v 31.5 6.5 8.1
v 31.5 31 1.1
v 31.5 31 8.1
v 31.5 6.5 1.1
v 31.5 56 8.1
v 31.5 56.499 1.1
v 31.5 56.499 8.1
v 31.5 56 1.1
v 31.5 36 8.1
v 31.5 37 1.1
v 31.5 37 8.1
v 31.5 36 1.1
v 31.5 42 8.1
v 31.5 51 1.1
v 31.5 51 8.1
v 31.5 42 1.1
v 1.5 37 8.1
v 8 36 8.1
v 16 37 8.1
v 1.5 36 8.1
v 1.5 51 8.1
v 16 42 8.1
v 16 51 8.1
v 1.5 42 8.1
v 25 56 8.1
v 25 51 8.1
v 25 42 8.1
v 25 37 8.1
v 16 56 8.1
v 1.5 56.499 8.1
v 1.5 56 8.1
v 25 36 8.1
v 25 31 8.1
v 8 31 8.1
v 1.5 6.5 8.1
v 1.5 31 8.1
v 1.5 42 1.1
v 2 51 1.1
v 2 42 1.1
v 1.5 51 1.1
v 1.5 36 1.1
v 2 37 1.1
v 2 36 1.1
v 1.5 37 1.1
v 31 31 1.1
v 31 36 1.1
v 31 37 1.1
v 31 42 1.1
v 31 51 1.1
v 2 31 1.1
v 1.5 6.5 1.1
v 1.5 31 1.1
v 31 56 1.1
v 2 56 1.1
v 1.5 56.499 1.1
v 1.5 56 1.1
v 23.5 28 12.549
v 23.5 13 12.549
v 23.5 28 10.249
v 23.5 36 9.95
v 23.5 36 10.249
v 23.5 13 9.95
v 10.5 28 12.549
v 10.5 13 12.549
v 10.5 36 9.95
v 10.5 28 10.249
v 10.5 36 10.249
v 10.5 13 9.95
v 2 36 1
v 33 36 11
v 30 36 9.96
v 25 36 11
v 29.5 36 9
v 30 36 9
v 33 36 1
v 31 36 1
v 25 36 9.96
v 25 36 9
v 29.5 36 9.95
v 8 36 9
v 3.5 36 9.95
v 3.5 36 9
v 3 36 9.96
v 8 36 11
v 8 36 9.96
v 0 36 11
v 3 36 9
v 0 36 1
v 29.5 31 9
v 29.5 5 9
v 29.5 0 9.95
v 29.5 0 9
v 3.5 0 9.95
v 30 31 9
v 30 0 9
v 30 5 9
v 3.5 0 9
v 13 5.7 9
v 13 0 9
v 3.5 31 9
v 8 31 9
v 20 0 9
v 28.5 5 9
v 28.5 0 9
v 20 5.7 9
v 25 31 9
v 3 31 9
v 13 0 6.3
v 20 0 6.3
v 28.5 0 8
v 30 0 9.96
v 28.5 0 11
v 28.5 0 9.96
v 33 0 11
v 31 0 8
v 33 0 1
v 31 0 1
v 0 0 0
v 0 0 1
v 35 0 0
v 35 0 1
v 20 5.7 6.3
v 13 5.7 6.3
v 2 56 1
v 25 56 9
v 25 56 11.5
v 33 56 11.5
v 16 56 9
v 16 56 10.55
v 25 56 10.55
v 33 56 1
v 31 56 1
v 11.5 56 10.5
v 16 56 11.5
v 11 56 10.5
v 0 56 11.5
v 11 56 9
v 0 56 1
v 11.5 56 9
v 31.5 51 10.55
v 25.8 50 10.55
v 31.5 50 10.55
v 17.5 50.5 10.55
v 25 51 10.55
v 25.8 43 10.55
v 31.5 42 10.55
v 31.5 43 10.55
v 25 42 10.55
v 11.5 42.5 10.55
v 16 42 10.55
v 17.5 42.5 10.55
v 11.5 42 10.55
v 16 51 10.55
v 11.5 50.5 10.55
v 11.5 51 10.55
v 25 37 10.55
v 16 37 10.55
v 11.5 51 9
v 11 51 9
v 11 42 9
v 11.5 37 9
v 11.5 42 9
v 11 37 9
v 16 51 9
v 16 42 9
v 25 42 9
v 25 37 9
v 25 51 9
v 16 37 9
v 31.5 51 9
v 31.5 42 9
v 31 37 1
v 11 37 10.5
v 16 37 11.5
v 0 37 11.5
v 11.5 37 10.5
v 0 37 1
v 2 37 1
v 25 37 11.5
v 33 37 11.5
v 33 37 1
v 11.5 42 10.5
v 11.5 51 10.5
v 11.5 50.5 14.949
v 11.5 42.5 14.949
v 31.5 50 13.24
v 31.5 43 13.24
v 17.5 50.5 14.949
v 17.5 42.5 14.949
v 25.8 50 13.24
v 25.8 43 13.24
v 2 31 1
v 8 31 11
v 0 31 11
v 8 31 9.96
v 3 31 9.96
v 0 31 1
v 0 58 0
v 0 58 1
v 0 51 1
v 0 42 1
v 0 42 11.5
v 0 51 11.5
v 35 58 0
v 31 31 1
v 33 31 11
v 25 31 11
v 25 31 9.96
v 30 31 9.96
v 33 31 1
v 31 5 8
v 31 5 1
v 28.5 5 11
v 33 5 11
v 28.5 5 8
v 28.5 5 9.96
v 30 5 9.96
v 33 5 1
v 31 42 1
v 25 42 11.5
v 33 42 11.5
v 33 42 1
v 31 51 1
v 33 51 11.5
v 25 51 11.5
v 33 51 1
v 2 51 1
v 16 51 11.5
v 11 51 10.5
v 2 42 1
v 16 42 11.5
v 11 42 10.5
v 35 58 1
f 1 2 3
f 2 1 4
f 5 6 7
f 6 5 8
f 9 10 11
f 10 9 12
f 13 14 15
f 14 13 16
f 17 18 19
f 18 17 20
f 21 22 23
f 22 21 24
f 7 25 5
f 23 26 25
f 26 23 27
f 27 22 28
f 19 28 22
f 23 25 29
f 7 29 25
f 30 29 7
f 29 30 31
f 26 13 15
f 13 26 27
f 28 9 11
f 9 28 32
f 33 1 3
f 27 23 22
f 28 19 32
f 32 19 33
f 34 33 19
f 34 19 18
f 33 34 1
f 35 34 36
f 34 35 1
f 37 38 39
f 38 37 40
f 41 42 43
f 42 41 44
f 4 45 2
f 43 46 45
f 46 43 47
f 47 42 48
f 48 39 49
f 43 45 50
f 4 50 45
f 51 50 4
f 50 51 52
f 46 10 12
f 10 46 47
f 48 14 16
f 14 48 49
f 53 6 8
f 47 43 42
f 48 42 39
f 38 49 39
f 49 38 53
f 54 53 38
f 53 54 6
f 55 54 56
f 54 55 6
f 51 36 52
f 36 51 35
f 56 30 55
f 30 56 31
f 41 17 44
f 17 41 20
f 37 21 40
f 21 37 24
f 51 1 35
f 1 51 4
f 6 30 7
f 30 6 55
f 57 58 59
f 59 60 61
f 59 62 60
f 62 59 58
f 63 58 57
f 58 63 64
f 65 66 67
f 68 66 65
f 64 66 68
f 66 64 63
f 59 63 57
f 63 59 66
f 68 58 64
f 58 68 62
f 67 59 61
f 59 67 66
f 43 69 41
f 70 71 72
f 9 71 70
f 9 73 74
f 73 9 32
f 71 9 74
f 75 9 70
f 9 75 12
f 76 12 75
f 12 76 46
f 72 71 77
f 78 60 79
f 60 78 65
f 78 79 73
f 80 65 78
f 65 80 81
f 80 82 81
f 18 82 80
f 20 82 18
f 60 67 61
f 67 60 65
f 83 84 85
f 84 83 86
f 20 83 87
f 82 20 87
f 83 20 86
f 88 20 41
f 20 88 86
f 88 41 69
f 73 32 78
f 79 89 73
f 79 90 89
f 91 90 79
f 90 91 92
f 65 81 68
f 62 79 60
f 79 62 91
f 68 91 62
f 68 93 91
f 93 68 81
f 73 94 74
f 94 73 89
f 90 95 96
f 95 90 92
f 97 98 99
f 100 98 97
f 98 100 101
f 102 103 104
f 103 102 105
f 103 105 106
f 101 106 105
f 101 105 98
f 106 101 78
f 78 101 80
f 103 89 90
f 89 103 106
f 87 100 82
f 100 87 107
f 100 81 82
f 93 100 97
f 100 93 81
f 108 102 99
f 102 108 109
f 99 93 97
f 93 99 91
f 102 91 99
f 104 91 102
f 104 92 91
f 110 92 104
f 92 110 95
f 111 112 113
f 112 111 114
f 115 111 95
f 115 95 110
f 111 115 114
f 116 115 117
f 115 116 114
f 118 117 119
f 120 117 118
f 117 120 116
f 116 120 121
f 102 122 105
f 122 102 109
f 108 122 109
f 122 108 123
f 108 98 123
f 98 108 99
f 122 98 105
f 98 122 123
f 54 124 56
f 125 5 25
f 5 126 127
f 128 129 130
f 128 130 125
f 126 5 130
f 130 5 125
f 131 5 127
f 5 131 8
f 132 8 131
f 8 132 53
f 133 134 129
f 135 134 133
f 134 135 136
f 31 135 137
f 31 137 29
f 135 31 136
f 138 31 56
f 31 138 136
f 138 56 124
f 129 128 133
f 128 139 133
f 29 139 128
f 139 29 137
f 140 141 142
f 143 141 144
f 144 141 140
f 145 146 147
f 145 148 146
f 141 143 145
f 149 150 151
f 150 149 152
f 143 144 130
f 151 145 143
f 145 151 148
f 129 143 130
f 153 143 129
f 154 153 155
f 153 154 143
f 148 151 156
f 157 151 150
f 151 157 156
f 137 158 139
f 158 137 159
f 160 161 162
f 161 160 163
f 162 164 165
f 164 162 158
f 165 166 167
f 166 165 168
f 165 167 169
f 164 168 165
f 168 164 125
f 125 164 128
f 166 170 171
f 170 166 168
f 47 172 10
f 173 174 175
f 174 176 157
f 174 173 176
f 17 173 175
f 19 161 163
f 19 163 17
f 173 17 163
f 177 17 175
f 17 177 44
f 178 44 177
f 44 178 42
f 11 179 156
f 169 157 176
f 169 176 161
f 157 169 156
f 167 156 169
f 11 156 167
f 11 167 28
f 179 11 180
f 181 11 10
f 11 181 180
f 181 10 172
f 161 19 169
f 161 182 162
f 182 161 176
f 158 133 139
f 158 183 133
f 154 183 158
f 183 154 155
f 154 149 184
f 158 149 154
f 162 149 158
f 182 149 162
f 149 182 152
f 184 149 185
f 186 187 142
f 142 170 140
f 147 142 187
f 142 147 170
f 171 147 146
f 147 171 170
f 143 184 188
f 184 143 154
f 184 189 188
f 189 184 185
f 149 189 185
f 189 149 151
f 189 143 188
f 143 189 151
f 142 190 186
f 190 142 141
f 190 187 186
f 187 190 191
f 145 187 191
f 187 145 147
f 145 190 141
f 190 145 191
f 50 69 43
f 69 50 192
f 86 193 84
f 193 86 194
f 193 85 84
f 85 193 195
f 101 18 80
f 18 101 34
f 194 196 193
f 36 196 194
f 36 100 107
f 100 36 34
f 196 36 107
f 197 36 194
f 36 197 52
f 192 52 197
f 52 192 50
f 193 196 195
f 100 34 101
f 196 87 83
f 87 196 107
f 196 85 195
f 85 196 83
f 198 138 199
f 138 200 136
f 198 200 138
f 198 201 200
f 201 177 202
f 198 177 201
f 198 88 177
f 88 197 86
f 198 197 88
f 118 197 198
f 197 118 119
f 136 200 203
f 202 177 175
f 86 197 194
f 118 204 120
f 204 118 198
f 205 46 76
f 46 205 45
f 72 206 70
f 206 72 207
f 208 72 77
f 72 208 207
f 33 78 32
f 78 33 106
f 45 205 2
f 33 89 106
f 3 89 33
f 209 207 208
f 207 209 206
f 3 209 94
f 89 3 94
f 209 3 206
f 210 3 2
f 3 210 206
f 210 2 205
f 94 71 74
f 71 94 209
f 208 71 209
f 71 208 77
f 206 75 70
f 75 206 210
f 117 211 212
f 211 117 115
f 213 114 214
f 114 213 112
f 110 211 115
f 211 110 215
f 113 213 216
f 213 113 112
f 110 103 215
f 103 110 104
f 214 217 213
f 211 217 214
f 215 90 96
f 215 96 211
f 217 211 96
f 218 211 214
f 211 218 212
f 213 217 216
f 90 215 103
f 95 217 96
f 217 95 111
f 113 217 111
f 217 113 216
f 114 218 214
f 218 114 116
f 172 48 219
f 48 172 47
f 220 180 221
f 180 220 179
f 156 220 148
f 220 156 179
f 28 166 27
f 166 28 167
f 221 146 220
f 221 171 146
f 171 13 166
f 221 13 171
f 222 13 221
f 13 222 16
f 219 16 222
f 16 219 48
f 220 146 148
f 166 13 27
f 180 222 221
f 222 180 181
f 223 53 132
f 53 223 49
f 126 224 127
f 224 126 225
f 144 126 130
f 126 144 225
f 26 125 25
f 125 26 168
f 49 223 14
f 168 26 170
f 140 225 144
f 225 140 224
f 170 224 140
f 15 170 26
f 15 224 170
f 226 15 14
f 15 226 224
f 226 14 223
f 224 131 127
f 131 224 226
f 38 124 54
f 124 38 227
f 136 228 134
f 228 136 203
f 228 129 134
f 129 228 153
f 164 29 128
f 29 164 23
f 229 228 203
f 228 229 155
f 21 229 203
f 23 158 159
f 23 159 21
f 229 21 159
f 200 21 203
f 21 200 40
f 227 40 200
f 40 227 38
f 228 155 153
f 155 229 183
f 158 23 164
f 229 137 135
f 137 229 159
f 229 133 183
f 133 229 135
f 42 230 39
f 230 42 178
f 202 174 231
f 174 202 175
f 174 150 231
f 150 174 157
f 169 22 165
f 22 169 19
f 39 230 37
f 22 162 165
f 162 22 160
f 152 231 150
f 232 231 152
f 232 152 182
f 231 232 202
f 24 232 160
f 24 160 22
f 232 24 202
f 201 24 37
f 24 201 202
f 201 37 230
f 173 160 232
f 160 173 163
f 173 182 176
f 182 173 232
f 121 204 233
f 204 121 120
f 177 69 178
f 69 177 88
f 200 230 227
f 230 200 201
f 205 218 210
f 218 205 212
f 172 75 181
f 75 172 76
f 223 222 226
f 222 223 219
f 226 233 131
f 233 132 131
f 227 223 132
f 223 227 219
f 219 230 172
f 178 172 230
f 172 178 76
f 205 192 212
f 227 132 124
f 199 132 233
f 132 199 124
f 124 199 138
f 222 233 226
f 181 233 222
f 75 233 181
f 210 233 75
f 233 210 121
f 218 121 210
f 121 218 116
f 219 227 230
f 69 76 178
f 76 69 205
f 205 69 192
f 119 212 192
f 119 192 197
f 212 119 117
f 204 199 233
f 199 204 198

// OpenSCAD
// the "face hugger"

// NON-PRINTED MODULES

module battery() {
    union() {
        color("silver")
            cube([30, 43.25, 7]);
        translate([0, 43.249, 0])
            color("yellow")
                cube([30, 6.75, 7]);
    }
}

module wemos() {
        union() {
            color([0.26, 0.32, 0.6])
                cube([26, 36, 0.95]); // board
            translate([7, 13, 0.949]) {
                color("silver")
                    cube([13, 15, 2.6]); // ESP8266 
                color("black")
                    cube([13, 23, 0.3]); // ESP8266 carrier
            }
            translate([9.5, 0, -2.7])
                color("silver")
                    cube([7, 5.7, 2.7]); // USB             
        }
}

module charger() {
        union() {
            color([0.26, 0.32, 0.6])
                cube([19, 20, 1.55]); // board
            translate([5.5, 14, 0.949])
                color("black")
                    cube([8, 6, 5]); // JST
            translate([6, 0, 1.54])
                color("silver")
                    cube([7, 5.7, 2.7]); // USB             
        }
}

// PRINTED SLED COMPONENTS

module wemos_grabber(depth) {
    union() {
        cube([2, 5, 11]);
        translate([-2-depth, 0, 8])
            difference() {
                cube([depth+2, 5, 3]);
                translate([-3, -1, 1])
                    cube([depth+4, 7, 0.96]);
            }

    }
}

module charger_grabber(depth, slot) {
    union() {
        cube([2, 5, 11.5]);
        translate([-2-depth, 0, 8])
            difference() {
                cube([depth+2, 5, 3.5]);
                translate([-3, -1, 1])
                    cube([slot+4, 7, 1.5]);
            }

    }
}

module sled() {
    // bottom plane
    cube([35, 58, 1]);

    // wemos grabbers
    translate([2, 36, 0]) // top left
    rotate([0, 0, 180])
        wemos_grabber(4);
    translate([31, 31, 0]) // top right
        wemos_grabber(4);    
    translate([31, 0, 0]) // bottom right
        wemos_grabber(0.5);
   
    // charger grabbers 
    translate([31, 37, 0]) // bottom right
        charger_grabber(4, 4.1);      
    translate([31, 51, 0]) // top right
        charger_grabber(4, 4.1);
    rotate([0, 0, 180]) {    
        translate([-2, -56, 0]) // top left
            charger_grabber(12, 4);      
        translate([-2, -42, 0]) // bottom left
            charger_grabber(12, 4);
    }

    // fillets
    
}

preview = 1;

if (preview) {
    translate([1.5, 6.5, 1.1])
        battery();

    translate([3.5, 0, 9])
        wemos();

    translate([31.5, 37, 9])
    rotate([0, 0, 90])
        charger();
}

sled();
